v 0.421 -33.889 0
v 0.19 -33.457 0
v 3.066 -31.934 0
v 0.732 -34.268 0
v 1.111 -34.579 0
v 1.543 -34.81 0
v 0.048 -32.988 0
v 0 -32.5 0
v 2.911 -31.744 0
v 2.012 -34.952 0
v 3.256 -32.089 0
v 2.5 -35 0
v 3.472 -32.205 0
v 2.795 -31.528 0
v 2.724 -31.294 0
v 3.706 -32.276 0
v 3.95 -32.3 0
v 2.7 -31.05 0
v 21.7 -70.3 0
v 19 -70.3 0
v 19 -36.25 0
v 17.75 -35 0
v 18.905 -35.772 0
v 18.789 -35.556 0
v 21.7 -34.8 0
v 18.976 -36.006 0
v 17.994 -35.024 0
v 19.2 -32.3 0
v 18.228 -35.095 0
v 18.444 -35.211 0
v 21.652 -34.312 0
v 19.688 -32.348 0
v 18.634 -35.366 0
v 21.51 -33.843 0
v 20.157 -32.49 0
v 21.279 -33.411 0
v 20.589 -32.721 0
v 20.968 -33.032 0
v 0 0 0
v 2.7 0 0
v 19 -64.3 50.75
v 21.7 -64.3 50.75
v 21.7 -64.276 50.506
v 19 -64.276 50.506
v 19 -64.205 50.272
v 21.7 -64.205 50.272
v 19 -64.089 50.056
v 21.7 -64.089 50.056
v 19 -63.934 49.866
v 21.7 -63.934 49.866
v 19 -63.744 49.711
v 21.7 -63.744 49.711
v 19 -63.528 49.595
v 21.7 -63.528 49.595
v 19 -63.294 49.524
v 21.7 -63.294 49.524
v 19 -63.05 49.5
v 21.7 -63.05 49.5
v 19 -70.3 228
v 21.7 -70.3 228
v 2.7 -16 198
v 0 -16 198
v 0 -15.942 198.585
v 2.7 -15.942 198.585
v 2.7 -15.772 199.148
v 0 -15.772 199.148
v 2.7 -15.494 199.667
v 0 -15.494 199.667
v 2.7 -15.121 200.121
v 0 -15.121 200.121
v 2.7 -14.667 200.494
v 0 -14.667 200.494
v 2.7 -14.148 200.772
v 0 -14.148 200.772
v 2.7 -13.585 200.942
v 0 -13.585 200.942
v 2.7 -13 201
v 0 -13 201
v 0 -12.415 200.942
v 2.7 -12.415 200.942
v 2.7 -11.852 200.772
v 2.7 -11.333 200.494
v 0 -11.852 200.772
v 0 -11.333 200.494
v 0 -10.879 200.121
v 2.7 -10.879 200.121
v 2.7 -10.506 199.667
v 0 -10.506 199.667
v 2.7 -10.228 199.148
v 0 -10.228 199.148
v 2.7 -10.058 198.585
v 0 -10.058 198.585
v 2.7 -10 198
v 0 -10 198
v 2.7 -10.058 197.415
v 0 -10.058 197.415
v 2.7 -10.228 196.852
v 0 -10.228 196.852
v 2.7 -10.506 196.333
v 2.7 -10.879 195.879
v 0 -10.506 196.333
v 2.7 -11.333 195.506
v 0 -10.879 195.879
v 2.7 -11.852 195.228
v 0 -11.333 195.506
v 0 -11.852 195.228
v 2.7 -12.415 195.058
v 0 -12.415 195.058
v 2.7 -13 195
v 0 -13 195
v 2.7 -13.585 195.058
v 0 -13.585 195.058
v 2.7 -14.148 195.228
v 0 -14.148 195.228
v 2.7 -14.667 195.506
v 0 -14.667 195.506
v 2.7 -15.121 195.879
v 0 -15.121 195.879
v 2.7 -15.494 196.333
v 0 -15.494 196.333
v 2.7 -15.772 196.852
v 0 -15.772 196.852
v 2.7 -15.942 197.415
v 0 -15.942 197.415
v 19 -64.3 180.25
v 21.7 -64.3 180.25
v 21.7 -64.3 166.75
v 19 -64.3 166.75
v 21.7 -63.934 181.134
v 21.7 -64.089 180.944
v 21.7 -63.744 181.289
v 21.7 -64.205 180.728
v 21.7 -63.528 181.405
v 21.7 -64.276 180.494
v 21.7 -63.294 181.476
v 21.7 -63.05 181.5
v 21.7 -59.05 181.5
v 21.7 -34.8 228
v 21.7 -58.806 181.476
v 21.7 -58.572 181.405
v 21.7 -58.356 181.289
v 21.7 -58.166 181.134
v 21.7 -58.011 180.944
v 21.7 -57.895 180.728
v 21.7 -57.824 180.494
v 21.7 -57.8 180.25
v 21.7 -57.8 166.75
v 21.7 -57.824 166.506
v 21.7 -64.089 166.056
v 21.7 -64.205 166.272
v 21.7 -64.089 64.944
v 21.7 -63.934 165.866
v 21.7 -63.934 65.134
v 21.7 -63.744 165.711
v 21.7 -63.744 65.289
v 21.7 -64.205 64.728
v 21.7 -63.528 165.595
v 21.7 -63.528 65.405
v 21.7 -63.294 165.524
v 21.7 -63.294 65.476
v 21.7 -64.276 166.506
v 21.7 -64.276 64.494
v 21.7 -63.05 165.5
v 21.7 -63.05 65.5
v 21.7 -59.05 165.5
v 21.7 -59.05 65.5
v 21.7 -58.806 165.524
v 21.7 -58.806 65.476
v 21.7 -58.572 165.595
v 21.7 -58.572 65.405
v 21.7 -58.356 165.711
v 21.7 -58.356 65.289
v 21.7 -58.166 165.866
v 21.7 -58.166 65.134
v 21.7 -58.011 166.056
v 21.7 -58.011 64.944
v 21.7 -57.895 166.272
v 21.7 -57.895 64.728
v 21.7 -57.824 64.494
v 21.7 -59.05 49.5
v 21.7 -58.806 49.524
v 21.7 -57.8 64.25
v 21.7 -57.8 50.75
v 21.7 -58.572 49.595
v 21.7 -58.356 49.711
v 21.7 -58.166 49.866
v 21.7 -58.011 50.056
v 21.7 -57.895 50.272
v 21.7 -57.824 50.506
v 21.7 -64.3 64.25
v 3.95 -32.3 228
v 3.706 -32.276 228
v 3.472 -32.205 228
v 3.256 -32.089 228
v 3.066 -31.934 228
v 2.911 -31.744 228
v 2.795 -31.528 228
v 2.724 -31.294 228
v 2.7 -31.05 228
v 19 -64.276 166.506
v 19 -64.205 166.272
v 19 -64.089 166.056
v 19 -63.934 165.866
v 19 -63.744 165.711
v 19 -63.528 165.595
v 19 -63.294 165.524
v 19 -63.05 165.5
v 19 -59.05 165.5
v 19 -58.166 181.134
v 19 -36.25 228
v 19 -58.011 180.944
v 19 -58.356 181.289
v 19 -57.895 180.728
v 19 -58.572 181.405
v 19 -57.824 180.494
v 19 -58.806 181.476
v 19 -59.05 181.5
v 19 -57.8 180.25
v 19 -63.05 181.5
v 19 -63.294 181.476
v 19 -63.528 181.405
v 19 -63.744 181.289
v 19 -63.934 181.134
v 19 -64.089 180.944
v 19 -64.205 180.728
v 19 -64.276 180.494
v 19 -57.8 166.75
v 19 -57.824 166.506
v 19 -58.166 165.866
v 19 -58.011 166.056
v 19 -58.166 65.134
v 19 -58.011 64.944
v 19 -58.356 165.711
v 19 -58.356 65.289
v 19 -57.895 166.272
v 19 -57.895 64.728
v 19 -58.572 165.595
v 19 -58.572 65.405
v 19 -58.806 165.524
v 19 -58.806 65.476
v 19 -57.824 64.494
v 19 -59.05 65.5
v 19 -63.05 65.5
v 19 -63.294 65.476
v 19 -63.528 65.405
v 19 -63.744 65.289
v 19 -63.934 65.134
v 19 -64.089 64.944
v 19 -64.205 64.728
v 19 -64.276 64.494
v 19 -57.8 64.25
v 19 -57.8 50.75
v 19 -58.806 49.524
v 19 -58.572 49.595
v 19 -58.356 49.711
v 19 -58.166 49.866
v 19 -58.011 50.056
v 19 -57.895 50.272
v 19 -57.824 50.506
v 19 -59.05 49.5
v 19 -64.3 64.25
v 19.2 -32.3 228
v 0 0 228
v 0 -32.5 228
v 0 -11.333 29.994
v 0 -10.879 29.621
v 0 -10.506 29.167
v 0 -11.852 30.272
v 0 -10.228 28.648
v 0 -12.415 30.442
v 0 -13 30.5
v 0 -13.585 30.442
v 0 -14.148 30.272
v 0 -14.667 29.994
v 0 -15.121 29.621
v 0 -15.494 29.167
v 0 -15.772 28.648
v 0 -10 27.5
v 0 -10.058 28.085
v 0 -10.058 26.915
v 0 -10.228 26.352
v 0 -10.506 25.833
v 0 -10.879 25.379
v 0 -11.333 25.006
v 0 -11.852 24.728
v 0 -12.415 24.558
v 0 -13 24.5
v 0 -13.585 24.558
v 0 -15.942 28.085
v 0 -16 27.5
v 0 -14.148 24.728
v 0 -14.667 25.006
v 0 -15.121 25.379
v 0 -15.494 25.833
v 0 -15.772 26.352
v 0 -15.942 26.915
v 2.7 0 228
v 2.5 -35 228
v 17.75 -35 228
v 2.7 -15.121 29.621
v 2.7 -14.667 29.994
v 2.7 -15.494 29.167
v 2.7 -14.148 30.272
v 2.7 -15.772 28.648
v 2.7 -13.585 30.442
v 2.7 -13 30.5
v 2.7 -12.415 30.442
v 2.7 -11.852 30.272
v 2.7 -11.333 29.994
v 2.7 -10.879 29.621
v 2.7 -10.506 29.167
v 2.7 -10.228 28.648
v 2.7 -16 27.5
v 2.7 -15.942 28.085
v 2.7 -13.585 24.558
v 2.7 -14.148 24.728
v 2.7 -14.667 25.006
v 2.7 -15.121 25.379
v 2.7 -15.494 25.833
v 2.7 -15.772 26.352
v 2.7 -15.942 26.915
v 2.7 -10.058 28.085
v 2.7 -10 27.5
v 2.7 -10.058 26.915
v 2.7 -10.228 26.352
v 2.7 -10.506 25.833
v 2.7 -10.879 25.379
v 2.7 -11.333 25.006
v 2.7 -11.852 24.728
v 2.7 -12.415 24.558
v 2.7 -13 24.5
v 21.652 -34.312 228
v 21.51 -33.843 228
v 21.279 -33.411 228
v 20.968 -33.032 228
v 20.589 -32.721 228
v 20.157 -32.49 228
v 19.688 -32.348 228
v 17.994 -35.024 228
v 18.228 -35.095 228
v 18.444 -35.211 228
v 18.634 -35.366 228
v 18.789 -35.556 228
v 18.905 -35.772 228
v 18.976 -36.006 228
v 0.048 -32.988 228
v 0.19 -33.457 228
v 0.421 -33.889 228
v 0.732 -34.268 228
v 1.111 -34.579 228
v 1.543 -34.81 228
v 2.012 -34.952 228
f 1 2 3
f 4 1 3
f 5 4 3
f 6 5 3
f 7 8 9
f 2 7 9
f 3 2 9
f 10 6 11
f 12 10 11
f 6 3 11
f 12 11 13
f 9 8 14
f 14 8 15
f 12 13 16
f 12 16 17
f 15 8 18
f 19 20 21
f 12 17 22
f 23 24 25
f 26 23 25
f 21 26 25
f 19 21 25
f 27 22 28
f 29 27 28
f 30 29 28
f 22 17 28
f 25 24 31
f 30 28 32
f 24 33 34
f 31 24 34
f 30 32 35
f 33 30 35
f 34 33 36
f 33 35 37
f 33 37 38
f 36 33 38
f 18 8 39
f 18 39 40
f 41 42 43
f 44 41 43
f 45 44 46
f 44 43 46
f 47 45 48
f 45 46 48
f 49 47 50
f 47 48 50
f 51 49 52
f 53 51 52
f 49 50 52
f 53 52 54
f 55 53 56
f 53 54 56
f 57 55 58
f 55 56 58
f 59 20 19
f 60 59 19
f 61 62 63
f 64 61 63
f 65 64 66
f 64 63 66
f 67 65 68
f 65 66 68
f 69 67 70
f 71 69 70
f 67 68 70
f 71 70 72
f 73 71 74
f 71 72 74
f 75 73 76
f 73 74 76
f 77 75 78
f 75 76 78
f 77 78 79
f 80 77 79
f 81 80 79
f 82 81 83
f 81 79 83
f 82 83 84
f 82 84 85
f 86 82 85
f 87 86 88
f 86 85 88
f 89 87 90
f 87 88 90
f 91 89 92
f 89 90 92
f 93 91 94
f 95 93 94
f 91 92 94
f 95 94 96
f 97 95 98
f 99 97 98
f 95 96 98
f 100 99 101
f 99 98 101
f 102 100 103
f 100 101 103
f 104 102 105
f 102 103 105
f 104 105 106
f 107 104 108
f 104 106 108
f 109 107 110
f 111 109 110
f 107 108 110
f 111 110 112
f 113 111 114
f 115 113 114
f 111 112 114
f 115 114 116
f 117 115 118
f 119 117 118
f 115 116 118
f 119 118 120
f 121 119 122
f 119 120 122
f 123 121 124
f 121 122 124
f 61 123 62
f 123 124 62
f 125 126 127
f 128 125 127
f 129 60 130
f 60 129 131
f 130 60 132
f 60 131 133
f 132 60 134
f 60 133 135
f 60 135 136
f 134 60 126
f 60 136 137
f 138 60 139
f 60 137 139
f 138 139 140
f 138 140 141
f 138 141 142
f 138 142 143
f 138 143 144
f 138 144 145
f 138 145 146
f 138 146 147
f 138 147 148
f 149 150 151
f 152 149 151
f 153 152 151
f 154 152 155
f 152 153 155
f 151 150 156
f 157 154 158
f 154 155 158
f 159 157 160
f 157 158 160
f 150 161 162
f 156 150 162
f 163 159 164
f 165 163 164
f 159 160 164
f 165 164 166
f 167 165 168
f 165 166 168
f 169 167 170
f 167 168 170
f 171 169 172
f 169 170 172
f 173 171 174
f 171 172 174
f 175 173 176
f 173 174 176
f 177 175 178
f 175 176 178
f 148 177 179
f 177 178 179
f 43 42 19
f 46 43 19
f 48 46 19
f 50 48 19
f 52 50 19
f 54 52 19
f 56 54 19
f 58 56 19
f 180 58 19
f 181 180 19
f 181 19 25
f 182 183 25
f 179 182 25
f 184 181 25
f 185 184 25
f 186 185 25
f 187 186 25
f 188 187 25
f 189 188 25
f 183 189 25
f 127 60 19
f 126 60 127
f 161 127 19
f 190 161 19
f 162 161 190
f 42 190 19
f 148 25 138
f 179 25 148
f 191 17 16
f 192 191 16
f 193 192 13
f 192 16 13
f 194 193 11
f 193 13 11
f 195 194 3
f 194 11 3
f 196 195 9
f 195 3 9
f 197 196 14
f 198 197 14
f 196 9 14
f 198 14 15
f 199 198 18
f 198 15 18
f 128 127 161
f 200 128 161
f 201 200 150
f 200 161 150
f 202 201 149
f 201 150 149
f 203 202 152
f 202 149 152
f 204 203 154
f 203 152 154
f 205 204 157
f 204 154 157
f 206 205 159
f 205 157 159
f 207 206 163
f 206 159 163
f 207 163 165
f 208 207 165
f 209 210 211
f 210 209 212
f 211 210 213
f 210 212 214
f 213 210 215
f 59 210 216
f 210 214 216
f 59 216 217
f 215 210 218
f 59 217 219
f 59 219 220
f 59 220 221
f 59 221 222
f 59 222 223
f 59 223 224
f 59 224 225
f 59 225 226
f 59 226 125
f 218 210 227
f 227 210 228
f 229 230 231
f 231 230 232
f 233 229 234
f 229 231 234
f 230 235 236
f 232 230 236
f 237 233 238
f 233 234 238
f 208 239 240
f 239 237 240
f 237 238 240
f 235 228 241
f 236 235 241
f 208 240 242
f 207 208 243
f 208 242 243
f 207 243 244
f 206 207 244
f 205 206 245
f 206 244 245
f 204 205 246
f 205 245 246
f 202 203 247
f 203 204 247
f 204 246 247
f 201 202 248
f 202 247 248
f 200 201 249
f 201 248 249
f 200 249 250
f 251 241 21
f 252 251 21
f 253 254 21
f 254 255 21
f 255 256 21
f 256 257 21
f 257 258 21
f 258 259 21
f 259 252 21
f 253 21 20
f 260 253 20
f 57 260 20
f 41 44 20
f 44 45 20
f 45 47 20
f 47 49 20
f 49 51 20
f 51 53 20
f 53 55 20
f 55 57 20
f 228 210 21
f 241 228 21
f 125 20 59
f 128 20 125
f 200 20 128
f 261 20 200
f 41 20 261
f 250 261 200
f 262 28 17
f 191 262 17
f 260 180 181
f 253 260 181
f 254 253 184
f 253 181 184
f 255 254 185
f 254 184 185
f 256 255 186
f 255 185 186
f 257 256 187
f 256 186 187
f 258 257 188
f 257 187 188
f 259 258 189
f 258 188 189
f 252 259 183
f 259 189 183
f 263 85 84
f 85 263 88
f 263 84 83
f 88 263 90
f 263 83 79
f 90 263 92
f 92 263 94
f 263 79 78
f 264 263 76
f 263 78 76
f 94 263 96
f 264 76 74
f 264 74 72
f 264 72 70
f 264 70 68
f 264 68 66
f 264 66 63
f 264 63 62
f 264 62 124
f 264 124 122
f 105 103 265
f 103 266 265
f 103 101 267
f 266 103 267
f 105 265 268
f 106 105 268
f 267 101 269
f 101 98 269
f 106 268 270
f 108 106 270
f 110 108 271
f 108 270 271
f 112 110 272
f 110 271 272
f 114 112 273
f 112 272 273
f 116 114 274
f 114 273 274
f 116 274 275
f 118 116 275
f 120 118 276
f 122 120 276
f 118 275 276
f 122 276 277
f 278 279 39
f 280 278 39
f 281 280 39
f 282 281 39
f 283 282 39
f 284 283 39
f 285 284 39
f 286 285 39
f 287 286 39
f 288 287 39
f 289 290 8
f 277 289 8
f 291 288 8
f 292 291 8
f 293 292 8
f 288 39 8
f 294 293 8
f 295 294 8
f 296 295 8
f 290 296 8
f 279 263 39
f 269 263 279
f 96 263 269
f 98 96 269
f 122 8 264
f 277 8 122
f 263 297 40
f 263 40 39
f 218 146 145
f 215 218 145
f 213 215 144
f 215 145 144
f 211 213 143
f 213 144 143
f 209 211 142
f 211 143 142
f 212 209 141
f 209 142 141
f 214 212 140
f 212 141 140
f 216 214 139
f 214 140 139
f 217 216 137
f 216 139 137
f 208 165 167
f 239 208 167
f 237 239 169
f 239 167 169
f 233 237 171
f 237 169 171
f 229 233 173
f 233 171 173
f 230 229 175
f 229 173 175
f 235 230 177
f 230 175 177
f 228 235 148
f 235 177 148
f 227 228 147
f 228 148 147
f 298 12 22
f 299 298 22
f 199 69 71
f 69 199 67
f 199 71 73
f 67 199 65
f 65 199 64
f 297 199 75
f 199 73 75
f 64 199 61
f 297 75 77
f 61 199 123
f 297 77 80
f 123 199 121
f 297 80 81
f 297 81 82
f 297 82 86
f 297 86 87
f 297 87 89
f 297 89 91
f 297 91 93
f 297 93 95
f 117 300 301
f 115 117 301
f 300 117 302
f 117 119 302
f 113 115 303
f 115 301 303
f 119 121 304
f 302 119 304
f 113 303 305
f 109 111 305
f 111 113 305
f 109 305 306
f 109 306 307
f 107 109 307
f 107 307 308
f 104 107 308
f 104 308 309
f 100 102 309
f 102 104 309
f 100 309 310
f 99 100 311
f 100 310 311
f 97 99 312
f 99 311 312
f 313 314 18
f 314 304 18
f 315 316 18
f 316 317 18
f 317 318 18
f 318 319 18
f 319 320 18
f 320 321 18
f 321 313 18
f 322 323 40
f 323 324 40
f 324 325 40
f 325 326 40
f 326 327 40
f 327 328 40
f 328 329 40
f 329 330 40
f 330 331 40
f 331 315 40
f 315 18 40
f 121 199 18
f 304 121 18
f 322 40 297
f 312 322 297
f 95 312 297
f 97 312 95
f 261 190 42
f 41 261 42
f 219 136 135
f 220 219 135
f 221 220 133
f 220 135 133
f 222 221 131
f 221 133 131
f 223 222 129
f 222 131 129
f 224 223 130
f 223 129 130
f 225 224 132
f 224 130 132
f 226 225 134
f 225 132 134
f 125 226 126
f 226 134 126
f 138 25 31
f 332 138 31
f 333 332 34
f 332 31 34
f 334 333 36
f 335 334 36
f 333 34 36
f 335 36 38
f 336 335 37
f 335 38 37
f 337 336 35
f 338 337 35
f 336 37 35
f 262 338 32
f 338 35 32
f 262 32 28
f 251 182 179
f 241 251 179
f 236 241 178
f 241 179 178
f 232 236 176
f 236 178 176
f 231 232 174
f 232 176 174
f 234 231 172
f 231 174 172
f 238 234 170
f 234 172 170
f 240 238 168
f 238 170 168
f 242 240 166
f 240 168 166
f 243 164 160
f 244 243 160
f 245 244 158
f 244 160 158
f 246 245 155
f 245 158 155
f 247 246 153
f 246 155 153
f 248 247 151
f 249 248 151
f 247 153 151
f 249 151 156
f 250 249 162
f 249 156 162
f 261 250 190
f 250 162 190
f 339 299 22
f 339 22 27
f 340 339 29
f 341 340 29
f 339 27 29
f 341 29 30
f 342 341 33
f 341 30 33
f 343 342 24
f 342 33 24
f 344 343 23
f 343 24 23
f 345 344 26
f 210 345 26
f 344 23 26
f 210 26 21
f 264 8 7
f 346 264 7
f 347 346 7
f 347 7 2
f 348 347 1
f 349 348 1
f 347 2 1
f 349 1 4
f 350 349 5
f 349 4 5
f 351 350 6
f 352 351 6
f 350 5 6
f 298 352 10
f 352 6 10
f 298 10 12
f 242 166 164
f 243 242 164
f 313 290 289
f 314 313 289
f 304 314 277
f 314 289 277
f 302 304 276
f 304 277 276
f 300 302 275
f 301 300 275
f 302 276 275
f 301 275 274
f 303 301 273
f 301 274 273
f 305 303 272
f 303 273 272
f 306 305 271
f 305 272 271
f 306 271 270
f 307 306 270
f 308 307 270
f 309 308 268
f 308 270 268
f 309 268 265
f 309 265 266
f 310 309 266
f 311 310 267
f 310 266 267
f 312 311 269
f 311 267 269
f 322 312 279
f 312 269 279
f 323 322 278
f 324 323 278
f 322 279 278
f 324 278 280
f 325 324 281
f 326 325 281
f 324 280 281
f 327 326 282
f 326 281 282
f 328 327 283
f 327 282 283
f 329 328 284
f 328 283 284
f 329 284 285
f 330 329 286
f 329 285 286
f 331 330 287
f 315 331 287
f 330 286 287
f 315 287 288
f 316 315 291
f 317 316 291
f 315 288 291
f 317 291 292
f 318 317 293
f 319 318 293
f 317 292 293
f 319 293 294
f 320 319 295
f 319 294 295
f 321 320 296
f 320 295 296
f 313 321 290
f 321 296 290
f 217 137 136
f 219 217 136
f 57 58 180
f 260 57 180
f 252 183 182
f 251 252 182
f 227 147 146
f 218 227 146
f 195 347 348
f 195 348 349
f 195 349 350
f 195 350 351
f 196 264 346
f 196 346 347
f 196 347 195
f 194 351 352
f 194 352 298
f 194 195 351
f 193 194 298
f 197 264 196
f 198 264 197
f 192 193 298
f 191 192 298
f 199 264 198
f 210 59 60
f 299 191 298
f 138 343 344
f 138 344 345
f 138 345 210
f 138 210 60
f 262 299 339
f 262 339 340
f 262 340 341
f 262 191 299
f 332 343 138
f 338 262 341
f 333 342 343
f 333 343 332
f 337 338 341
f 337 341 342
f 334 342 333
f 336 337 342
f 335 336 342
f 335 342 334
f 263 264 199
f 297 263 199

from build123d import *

# Parameters (mm, degrees)
F1_DEPTH = 228
F2_R     = 3
F3_DEPTH = 2.7
F5_DEPTH = 2.7


with BuildPart() as f1:
    # F0 (on Top) → F1 (new body)
    with BuildSketch(Plane.XY):
        with BuildLine():
            Line((2.7, 0), (0, 0))
            Line((0, 0), (0, -32.5))
            ThreePointArc((0, -32.5), (0.732233, -34.267767), (2.5, -35))
            Line((2.5, -35), (17.75, -35))
            ThreePointArc((17.75, -35), (18.633883, -35.366117), (19, -36.25))
            Line((19, -36.25), (19, -70.3))
            Line((19, -70.3), (21.7, -70.3))
            Line((21.7, -70.3), (21.7, -34.8))
            ThreePointArc((21.7, -34.8), (20.967767, -33.032233), (19.2, -32.3))
            Line((19.2, -32.3), (3.95, -32.3))
            ThreePointArc((3.95, -32.3), (3.066117, -31.933883), (2.7, -31.05))
            Line((2.7, -31.05), (2.7, 0))
        make_face()
    extrude(amount=F1_DEPTH)

    # F2 (on face) → F3 (cut)
    with BuildSketch(Plane(origin=(0, 0, 0), x_dir=(0, -1, 0), z_dir=(-1, 0, 0))):
        with Locations((13, 198)):
            Circle(F2_R)
        with Locations((13, 27.5)):
            Circle(F2_R)
    extrude(amount=-F3_DEPTH, mode=Mode.SUBTRACT)

    # F4 (on face) → F5 (cut)
    with BuildSketch(Plane.YZ.offset(21.7)):
        with BuildLine():
            ThreePointArc((-57.8, 64.25), (-58.166117, 65.133883), (-59.05, 65.5))
            Line((-59.05, 65.5), (-63.05, 65.5))
            ThreePointArc((-63.05, 65.5), (-63.933883, 65.133883), (-64.3, 64.25))
            Line((-64.3, 64.25), (-64.3, 50.75))
            ThreePointArc((-64.3, 50.75), (-63.933883, 49.866117), (-63.05, 49.5))
            Line((-63.05, 49.5), (-59.05, 49.5))
            ThreePointArc((-59.05, 49.5), (-58.166117, 49.866117), (-57.8, 50.75))
            Line((-57.8, 50.75), (-57.8, 64.25))
        make_face()
        with BuildLine():
            ThreePointArc((-57.8, 180.25), (-58.166117, 181.133883), (-59.05, 181.5))
            Line((-59.05, 181.5), (-63.05, 181.5))
            ThreePointArc((-63.05, 181.5), (-63.933883, 181.133883), (-64.3, 180.25))
            Line((-64.3, 180.25), (-64.3, 166.75))
            ThreePointArc((-64.3, 166.75), (-63.933883, 165.866117), (-63.05, 165.5))
            Line((-63.05, 165.5), (-59.05, 165.5))
            ThreePointArc((-59.05, 165.5), (-58.166117, 165.866117), (-57.8, 166.75))
            Line((-57.8, 166.75), (-57.8, 180.25))
        make_face()
    extrude(amount=-F5_DEPTH, mode=Mode.SUBTRACT)


solid = f1.part
